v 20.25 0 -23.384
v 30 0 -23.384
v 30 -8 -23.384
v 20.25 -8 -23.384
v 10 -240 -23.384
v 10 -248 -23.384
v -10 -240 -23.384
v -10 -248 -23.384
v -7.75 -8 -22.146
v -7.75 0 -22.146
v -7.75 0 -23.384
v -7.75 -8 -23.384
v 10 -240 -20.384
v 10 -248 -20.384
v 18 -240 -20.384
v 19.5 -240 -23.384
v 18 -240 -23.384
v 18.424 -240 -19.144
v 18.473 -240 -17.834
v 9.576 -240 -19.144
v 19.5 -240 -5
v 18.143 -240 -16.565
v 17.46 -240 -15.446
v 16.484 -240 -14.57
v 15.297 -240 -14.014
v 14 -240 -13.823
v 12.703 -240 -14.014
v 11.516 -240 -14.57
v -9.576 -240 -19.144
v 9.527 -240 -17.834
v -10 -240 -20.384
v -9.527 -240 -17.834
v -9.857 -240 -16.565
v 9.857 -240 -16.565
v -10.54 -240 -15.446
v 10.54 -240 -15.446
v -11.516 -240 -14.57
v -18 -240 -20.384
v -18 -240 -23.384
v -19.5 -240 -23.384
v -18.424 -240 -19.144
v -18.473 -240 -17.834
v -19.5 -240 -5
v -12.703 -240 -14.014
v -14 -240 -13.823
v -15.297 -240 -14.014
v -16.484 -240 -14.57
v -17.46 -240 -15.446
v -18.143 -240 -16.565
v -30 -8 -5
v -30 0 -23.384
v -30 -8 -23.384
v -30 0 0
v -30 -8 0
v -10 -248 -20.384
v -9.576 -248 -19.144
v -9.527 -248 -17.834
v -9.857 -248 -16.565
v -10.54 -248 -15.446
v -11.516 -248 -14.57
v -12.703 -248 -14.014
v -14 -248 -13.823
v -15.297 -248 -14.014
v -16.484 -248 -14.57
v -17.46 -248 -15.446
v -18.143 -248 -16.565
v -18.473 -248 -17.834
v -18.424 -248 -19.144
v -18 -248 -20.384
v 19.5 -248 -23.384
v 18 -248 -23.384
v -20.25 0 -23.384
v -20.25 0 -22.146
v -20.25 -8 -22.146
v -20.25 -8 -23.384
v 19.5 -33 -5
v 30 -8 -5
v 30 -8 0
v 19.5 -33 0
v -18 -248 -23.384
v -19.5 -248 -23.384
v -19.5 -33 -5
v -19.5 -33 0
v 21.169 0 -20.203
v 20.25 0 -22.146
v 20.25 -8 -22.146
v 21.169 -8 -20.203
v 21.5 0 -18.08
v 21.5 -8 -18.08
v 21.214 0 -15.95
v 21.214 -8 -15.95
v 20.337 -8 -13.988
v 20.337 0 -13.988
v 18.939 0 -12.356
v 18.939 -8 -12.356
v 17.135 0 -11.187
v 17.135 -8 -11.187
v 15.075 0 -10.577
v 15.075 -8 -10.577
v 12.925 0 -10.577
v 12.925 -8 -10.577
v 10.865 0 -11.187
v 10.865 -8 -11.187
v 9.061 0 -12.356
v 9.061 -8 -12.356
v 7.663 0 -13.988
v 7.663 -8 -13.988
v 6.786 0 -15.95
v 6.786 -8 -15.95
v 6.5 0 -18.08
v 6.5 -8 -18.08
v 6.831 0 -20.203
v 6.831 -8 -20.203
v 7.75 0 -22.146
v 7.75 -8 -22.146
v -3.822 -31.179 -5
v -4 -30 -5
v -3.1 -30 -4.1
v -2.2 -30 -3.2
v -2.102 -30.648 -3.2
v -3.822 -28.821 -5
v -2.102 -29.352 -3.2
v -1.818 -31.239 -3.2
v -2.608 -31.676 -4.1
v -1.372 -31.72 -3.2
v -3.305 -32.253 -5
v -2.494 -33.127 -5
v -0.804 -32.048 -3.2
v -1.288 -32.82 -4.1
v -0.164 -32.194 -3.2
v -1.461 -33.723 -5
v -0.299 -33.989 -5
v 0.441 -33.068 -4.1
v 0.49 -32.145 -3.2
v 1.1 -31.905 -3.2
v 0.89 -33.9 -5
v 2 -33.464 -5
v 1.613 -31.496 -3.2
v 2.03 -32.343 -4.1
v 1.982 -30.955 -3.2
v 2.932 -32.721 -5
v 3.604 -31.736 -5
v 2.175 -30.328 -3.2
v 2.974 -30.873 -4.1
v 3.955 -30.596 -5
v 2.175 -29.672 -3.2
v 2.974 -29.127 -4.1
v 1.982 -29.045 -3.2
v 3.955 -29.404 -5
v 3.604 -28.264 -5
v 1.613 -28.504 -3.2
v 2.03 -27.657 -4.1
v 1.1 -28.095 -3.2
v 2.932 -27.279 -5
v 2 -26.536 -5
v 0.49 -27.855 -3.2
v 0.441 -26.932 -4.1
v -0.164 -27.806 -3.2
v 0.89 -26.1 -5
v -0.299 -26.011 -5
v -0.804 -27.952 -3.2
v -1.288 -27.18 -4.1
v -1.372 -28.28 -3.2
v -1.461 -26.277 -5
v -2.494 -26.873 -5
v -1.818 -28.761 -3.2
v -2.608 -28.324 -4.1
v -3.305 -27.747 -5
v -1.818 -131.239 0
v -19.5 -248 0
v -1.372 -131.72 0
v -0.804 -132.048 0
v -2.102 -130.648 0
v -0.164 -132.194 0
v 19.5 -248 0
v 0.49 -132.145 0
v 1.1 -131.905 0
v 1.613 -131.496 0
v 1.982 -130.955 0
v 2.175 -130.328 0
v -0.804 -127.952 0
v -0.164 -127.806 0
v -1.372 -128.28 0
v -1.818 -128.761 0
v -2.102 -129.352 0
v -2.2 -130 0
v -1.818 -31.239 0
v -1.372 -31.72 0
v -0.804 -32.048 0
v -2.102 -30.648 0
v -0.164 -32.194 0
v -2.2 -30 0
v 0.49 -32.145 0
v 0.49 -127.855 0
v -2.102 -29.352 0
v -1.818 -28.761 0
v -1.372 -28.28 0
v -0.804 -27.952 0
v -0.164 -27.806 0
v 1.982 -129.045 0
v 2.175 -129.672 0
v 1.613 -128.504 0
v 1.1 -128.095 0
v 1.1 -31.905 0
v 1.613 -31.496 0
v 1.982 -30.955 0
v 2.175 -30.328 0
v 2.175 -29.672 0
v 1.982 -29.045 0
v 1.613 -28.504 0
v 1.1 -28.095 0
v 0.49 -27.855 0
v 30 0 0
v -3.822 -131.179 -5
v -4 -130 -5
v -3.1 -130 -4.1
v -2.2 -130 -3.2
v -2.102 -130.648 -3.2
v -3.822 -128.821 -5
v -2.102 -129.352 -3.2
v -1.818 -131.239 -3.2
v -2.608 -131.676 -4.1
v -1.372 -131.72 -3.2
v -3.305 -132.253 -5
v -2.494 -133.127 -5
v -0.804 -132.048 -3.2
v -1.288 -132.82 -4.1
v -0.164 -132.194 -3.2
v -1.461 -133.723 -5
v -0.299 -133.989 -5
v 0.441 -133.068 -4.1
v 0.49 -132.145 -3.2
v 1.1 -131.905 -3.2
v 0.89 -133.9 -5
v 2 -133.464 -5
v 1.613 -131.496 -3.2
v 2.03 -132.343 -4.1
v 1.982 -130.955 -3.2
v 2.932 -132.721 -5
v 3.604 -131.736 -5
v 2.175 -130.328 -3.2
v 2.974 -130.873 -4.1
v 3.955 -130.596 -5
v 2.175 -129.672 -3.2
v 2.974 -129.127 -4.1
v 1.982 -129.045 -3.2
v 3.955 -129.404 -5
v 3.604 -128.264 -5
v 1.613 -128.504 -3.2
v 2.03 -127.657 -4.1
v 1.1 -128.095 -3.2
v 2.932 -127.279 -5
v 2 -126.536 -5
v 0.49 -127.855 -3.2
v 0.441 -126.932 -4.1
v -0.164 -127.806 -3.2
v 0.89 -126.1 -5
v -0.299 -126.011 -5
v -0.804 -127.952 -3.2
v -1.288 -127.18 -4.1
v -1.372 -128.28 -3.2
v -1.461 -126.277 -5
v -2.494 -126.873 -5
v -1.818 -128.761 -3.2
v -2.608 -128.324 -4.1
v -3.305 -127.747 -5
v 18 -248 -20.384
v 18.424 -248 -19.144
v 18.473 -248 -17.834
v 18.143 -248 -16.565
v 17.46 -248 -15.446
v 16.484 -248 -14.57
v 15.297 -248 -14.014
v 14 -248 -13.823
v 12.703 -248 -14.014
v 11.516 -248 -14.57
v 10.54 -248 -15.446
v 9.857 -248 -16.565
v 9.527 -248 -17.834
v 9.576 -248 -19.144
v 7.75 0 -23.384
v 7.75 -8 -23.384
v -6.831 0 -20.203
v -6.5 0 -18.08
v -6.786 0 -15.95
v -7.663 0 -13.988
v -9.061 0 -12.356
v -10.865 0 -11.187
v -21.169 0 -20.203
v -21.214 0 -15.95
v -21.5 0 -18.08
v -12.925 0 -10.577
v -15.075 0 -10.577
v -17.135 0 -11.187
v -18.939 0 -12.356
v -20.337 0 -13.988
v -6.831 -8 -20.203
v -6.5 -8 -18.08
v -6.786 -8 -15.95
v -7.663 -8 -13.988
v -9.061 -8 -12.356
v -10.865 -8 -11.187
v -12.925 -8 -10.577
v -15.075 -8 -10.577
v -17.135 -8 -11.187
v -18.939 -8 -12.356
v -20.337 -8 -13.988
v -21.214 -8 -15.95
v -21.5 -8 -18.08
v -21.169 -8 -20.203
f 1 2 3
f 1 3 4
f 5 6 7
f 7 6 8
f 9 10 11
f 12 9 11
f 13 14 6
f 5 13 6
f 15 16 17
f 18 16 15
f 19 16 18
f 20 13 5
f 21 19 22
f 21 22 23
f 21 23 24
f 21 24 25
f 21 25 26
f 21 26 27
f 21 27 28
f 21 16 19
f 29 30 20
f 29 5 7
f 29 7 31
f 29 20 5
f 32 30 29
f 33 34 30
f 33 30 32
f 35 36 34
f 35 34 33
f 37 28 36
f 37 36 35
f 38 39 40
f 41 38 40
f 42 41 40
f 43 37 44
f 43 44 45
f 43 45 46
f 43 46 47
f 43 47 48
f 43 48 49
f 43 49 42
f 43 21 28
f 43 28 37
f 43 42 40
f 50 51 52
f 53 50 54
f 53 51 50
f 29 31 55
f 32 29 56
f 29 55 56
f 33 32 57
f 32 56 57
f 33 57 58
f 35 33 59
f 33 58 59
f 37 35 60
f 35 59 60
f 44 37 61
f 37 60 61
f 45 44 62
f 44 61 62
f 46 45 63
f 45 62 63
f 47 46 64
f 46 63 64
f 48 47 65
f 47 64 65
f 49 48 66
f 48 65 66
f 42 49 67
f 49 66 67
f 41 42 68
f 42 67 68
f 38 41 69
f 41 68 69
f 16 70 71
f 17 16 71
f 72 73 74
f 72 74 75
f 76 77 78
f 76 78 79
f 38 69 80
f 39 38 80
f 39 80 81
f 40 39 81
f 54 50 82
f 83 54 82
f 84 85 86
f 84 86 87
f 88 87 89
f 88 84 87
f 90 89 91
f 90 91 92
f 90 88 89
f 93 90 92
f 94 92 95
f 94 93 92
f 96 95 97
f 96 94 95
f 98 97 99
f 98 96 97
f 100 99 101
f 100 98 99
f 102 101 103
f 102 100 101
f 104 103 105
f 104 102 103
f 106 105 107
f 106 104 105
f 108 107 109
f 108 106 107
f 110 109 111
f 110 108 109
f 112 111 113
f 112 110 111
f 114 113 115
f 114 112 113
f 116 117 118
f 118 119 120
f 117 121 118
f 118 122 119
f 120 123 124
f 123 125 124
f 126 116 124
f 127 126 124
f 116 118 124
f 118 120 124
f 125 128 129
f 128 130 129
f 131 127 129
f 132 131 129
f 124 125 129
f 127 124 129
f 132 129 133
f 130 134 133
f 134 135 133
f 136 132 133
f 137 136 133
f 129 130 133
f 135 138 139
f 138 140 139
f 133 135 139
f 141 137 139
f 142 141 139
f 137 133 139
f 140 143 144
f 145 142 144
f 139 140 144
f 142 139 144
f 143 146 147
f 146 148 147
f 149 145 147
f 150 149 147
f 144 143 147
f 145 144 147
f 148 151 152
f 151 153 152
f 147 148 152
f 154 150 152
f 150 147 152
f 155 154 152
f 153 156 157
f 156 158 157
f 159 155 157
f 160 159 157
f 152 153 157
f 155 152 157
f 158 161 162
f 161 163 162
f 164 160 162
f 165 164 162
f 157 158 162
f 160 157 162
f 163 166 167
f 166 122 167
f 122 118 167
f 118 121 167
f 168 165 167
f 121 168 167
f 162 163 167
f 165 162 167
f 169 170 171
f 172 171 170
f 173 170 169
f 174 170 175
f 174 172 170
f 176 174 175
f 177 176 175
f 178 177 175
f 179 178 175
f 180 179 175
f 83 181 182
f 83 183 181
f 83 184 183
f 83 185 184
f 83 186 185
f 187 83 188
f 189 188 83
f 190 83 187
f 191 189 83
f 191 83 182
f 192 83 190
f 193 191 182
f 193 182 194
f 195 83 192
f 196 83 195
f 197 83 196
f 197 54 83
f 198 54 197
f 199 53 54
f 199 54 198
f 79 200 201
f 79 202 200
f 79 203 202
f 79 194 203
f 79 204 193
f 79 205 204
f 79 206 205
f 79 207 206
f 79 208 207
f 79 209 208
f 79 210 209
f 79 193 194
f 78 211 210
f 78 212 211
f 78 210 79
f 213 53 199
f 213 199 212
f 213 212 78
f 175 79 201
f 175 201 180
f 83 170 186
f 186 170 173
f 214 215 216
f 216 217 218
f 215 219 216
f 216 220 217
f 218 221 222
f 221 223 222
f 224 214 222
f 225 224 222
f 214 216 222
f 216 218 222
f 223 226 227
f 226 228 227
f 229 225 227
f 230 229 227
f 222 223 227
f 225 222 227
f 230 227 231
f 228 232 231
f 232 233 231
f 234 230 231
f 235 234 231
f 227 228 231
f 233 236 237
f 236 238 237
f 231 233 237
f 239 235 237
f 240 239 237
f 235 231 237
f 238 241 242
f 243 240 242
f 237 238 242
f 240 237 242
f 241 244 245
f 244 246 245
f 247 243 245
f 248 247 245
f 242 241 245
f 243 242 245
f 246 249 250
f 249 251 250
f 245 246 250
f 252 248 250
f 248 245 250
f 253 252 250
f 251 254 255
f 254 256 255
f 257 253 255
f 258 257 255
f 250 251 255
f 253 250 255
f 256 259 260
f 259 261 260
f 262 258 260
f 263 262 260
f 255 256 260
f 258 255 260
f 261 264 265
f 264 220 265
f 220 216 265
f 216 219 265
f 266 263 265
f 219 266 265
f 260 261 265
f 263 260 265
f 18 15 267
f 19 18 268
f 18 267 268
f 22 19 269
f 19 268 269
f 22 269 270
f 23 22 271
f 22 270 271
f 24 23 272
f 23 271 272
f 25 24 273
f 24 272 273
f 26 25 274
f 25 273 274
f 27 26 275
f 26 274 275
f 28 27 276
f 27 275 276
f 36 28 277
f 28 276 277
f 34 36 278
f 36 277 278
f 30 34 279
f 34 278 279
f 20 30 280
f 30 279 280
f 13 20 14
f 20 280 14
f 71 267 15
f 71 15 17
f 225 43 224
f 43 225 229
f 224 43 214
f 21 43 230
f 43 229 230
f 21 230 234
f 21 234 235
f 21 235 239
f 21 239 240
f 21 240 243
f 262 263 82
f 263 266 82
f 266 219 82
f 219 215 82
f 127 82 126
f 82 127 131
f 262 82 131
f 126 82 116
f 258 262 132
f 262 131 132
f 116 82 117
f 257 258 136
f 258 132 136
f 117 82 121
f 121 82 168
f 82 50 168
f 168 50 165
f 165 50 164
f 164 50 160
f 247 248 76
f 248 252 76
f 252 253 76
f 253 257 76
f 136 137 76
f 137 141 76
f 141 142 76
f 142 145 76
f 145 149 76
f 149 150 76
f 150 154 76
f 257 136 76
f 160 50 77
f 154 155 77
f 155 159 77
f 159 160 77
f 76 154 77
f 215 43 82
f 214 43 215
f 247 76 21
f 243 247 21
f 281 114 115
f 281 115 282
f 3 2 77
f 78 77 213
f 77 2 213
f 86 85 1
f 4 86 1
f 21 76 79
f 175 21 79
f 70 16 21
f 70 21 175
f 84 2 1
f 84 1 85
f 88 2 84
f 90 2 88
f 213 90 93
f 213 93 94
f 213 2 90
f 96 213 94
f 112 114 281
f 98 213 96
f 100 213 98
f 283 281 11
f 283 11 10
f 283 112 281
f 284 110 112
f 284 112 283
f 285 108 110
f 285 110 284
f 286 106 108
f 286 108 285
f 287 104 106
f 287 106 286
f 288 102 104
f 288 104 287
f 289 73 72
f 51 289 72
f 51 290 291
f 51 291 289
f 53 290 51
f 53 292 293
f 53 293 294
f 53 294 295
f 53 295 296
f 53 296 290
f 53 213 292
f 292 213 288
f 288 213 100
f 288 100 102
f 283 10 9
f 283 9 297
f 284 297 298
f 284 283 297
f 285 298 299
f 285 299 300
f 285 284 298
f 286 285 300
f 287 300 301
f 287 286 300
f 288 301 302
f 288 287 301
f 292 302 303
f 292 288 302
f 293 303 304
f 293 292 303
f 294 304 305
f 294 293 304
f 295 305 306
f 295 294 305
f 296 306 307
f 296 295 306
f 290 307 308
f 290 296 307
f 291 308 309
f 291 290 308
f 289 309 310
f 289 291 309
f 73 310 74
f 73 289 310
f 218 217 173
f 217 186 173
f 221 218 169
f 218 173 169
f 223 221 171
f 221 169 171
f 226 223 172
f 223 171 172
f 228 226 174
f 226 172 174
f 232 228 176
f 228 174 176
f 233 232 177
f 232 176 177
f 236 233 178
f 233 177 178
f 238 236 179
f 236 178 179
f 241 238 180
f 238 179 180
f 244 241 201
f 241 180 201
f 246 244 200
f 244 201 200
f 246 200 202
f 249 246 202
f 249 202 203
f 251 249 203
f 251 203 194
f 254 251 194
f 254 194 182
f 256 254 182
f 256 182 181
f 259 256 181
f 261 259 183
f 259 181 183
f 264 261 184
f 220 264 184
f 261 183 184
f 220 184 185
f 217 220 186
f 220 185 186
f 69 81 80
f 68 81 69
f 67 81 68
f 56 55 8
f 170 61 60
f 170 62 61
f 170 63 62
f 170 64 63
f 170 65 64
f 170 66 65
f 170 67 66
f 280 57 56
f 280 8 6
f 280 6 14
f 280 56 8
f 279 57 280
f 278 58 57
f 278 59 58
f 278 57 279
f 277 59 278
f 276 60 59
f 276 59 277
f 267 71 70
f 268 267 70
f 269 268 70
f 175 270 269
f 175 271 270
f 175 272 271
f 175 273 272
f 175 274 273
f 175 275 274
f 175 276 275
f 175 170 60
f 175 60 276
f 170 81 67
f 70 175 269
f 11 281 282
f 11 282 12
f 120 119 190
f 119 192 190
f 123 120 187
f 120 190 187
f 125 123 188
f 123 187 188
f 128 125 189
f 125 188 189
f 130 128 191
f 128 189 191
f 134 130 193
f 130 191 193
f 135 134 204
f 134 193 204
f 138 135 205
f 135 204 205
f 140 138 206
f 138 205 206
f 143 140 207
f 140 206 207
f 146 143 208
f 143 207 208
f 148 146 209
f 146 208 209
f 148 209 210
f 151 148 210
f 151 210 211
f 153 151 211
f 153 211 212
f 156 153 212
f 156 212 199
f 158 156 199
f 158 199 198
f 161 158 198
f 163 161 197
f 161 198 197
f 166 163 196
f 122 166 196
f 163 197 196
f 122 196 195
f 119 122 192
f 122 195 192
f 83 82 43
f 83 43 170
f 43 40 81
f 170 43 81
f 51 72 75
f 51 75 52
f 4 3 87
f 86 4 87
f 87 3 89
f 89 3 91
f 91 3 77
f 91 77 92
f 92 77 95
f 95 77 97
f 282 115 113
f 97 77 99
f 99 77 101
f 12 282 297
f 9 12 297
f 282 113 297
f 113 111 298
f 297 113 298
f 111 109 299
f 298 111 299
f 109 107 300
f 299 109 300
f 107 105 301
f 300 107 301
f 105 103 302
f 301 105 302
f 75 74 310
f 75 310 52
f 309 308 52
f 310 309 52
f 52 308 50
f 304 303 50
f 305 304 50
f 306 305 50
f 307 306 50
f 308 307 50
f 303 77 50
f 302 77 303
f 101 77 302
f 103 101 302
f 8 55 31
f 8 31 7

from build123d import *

# Parameters (mm, degrees)
PAD_DEPTH        = 8
SKETCH001_W      = 60
SKETCH001_H      = 5
PAD001_DEPTH     = 240
POCKET_DEPTH     = 5.001
POCKET001_DEPTH  = 5.001
PAD002_DEPTH     = 8
HOLE_D           = 4.4
HOLE_CSINK_D     = 8
HOLE_CSINK_ANGLE = 90


with BuildPart() as part:
    # Sketch → Pad (new body)
    with BuildSketch(Plane.XZ):
        with BuildLine():
            Line((-30, 0), (30, 0))
            Line((30, 0), (30, -23.38422))
            Line((30, -23.38422), (20.25, -23.38422))
            Line((20.25, -22.145781), (20.25, -23.38422))
            ThreePointArc((20.25, -22.145781), (14, -10.5), (7.75, -22.145781))
            Line((7.75, -22.145781), (7.75, -23.38422))
            Line((7.75, -23.38422), (-7.75, -23.38422))
            Line((-7.75, -22.145781), (-7.75, -23.38422))
            ThreePointArc((-7.75, -22.145781), (-14, -10.5), (-20.25, -22.145781))
            Line((-20.25, -22.145781), (-20.25, -23.38422))
            Line((-20.25, -23.38422), (-30, -23.38422))
            Line((-30, -23.38422), (-30, 0))
        make_face()
    extrude(amount=PAD_DEPTH)

    # Sketch001 (on Face14 of Pad) → Pad001 (join)
    with BuildSketch(Plane.XZ.offset(8)):
        with Locations((0, -2.5)):
            Rectangle(SKETCH001_W, SKETCH001_H)
    extrude(amount=PAD001_DEPTH)

    # Sketch002 (on Face15 of Pad001) → Pocket (cut, through all)
    with BuildSketch(Plane(origin=(0, 0, -5), x_dir=(1, 0, 0), z_dir=(0, 0, -1))):
        Polygon((-19.5, 251), (-33, 251), (-33, 0.857143), (-19.5, 33), align=None)
    extrude(amount=-POCKET_DEPTH, mode=Mode.SUBTRACT)

    # Sketch003 (on Face15 of Pocket) → Pocket001 (cut, through all)
    with BuildSketch(Plane(origin=(0, 0, -5), x_dir=(1, 0, 0), z_dir=(0, 0, -1))):
        Polygon((19.5, 251), (33, 251), (33, 0.857143), (19.5, 33), align=None)
    extrude(amount=-POCKET001_DEPTH, mode=Mode.SUBTRACT)

    # Sketch004 (on Face20 of Pocket001) → Pad002 (join)
    with BuildSketch(Plane.XZ.offset(248)):
        with BuildLine():
            Line((-19.5, 0), (19.5, 0))
            Line((19.5, 0), (19.5, -23.38422))
            Line((19.5, -23.38422), (18, -23.38422))
            Line((18, -20.38422), (18, -23.38422))
            ThreePointArc((18, -20.38422), (14, -13.822667), (10, -20.38422))
            Line((10, -20.38422), (10, -23.38422))
            Line((10, -23.38422), (-10, -23.38422))
            Line((-10, -20.38422), (-10, -23.38422))
            ThreePointArc((-10, -20.38422), (-14, -13.822667), (-18, -20.38422))
            Line((-18, -20.38422), (-18, -23.38422))
            Line((-18, -23.38422), (-19.5, -23.38422))
            Line((-19.5, -23.38422), (-19.5, 0))
        make_face()
    extrude(amount=-PAD002_DEPTH)

    # Hole (through all)
    with Locations(Plane(origin=(0, 0, -5), x_dir=(1, 0, 0), z_dir=(0, 0, -1))):
        with Locations((0, 30), (0, 130)):
            CounterSinkHole(HOLE_D / 2, HOLE_CSINK_D / 2, counter_sink_angle=HOLE_CSINK_ANGLE)


solid = part.part
